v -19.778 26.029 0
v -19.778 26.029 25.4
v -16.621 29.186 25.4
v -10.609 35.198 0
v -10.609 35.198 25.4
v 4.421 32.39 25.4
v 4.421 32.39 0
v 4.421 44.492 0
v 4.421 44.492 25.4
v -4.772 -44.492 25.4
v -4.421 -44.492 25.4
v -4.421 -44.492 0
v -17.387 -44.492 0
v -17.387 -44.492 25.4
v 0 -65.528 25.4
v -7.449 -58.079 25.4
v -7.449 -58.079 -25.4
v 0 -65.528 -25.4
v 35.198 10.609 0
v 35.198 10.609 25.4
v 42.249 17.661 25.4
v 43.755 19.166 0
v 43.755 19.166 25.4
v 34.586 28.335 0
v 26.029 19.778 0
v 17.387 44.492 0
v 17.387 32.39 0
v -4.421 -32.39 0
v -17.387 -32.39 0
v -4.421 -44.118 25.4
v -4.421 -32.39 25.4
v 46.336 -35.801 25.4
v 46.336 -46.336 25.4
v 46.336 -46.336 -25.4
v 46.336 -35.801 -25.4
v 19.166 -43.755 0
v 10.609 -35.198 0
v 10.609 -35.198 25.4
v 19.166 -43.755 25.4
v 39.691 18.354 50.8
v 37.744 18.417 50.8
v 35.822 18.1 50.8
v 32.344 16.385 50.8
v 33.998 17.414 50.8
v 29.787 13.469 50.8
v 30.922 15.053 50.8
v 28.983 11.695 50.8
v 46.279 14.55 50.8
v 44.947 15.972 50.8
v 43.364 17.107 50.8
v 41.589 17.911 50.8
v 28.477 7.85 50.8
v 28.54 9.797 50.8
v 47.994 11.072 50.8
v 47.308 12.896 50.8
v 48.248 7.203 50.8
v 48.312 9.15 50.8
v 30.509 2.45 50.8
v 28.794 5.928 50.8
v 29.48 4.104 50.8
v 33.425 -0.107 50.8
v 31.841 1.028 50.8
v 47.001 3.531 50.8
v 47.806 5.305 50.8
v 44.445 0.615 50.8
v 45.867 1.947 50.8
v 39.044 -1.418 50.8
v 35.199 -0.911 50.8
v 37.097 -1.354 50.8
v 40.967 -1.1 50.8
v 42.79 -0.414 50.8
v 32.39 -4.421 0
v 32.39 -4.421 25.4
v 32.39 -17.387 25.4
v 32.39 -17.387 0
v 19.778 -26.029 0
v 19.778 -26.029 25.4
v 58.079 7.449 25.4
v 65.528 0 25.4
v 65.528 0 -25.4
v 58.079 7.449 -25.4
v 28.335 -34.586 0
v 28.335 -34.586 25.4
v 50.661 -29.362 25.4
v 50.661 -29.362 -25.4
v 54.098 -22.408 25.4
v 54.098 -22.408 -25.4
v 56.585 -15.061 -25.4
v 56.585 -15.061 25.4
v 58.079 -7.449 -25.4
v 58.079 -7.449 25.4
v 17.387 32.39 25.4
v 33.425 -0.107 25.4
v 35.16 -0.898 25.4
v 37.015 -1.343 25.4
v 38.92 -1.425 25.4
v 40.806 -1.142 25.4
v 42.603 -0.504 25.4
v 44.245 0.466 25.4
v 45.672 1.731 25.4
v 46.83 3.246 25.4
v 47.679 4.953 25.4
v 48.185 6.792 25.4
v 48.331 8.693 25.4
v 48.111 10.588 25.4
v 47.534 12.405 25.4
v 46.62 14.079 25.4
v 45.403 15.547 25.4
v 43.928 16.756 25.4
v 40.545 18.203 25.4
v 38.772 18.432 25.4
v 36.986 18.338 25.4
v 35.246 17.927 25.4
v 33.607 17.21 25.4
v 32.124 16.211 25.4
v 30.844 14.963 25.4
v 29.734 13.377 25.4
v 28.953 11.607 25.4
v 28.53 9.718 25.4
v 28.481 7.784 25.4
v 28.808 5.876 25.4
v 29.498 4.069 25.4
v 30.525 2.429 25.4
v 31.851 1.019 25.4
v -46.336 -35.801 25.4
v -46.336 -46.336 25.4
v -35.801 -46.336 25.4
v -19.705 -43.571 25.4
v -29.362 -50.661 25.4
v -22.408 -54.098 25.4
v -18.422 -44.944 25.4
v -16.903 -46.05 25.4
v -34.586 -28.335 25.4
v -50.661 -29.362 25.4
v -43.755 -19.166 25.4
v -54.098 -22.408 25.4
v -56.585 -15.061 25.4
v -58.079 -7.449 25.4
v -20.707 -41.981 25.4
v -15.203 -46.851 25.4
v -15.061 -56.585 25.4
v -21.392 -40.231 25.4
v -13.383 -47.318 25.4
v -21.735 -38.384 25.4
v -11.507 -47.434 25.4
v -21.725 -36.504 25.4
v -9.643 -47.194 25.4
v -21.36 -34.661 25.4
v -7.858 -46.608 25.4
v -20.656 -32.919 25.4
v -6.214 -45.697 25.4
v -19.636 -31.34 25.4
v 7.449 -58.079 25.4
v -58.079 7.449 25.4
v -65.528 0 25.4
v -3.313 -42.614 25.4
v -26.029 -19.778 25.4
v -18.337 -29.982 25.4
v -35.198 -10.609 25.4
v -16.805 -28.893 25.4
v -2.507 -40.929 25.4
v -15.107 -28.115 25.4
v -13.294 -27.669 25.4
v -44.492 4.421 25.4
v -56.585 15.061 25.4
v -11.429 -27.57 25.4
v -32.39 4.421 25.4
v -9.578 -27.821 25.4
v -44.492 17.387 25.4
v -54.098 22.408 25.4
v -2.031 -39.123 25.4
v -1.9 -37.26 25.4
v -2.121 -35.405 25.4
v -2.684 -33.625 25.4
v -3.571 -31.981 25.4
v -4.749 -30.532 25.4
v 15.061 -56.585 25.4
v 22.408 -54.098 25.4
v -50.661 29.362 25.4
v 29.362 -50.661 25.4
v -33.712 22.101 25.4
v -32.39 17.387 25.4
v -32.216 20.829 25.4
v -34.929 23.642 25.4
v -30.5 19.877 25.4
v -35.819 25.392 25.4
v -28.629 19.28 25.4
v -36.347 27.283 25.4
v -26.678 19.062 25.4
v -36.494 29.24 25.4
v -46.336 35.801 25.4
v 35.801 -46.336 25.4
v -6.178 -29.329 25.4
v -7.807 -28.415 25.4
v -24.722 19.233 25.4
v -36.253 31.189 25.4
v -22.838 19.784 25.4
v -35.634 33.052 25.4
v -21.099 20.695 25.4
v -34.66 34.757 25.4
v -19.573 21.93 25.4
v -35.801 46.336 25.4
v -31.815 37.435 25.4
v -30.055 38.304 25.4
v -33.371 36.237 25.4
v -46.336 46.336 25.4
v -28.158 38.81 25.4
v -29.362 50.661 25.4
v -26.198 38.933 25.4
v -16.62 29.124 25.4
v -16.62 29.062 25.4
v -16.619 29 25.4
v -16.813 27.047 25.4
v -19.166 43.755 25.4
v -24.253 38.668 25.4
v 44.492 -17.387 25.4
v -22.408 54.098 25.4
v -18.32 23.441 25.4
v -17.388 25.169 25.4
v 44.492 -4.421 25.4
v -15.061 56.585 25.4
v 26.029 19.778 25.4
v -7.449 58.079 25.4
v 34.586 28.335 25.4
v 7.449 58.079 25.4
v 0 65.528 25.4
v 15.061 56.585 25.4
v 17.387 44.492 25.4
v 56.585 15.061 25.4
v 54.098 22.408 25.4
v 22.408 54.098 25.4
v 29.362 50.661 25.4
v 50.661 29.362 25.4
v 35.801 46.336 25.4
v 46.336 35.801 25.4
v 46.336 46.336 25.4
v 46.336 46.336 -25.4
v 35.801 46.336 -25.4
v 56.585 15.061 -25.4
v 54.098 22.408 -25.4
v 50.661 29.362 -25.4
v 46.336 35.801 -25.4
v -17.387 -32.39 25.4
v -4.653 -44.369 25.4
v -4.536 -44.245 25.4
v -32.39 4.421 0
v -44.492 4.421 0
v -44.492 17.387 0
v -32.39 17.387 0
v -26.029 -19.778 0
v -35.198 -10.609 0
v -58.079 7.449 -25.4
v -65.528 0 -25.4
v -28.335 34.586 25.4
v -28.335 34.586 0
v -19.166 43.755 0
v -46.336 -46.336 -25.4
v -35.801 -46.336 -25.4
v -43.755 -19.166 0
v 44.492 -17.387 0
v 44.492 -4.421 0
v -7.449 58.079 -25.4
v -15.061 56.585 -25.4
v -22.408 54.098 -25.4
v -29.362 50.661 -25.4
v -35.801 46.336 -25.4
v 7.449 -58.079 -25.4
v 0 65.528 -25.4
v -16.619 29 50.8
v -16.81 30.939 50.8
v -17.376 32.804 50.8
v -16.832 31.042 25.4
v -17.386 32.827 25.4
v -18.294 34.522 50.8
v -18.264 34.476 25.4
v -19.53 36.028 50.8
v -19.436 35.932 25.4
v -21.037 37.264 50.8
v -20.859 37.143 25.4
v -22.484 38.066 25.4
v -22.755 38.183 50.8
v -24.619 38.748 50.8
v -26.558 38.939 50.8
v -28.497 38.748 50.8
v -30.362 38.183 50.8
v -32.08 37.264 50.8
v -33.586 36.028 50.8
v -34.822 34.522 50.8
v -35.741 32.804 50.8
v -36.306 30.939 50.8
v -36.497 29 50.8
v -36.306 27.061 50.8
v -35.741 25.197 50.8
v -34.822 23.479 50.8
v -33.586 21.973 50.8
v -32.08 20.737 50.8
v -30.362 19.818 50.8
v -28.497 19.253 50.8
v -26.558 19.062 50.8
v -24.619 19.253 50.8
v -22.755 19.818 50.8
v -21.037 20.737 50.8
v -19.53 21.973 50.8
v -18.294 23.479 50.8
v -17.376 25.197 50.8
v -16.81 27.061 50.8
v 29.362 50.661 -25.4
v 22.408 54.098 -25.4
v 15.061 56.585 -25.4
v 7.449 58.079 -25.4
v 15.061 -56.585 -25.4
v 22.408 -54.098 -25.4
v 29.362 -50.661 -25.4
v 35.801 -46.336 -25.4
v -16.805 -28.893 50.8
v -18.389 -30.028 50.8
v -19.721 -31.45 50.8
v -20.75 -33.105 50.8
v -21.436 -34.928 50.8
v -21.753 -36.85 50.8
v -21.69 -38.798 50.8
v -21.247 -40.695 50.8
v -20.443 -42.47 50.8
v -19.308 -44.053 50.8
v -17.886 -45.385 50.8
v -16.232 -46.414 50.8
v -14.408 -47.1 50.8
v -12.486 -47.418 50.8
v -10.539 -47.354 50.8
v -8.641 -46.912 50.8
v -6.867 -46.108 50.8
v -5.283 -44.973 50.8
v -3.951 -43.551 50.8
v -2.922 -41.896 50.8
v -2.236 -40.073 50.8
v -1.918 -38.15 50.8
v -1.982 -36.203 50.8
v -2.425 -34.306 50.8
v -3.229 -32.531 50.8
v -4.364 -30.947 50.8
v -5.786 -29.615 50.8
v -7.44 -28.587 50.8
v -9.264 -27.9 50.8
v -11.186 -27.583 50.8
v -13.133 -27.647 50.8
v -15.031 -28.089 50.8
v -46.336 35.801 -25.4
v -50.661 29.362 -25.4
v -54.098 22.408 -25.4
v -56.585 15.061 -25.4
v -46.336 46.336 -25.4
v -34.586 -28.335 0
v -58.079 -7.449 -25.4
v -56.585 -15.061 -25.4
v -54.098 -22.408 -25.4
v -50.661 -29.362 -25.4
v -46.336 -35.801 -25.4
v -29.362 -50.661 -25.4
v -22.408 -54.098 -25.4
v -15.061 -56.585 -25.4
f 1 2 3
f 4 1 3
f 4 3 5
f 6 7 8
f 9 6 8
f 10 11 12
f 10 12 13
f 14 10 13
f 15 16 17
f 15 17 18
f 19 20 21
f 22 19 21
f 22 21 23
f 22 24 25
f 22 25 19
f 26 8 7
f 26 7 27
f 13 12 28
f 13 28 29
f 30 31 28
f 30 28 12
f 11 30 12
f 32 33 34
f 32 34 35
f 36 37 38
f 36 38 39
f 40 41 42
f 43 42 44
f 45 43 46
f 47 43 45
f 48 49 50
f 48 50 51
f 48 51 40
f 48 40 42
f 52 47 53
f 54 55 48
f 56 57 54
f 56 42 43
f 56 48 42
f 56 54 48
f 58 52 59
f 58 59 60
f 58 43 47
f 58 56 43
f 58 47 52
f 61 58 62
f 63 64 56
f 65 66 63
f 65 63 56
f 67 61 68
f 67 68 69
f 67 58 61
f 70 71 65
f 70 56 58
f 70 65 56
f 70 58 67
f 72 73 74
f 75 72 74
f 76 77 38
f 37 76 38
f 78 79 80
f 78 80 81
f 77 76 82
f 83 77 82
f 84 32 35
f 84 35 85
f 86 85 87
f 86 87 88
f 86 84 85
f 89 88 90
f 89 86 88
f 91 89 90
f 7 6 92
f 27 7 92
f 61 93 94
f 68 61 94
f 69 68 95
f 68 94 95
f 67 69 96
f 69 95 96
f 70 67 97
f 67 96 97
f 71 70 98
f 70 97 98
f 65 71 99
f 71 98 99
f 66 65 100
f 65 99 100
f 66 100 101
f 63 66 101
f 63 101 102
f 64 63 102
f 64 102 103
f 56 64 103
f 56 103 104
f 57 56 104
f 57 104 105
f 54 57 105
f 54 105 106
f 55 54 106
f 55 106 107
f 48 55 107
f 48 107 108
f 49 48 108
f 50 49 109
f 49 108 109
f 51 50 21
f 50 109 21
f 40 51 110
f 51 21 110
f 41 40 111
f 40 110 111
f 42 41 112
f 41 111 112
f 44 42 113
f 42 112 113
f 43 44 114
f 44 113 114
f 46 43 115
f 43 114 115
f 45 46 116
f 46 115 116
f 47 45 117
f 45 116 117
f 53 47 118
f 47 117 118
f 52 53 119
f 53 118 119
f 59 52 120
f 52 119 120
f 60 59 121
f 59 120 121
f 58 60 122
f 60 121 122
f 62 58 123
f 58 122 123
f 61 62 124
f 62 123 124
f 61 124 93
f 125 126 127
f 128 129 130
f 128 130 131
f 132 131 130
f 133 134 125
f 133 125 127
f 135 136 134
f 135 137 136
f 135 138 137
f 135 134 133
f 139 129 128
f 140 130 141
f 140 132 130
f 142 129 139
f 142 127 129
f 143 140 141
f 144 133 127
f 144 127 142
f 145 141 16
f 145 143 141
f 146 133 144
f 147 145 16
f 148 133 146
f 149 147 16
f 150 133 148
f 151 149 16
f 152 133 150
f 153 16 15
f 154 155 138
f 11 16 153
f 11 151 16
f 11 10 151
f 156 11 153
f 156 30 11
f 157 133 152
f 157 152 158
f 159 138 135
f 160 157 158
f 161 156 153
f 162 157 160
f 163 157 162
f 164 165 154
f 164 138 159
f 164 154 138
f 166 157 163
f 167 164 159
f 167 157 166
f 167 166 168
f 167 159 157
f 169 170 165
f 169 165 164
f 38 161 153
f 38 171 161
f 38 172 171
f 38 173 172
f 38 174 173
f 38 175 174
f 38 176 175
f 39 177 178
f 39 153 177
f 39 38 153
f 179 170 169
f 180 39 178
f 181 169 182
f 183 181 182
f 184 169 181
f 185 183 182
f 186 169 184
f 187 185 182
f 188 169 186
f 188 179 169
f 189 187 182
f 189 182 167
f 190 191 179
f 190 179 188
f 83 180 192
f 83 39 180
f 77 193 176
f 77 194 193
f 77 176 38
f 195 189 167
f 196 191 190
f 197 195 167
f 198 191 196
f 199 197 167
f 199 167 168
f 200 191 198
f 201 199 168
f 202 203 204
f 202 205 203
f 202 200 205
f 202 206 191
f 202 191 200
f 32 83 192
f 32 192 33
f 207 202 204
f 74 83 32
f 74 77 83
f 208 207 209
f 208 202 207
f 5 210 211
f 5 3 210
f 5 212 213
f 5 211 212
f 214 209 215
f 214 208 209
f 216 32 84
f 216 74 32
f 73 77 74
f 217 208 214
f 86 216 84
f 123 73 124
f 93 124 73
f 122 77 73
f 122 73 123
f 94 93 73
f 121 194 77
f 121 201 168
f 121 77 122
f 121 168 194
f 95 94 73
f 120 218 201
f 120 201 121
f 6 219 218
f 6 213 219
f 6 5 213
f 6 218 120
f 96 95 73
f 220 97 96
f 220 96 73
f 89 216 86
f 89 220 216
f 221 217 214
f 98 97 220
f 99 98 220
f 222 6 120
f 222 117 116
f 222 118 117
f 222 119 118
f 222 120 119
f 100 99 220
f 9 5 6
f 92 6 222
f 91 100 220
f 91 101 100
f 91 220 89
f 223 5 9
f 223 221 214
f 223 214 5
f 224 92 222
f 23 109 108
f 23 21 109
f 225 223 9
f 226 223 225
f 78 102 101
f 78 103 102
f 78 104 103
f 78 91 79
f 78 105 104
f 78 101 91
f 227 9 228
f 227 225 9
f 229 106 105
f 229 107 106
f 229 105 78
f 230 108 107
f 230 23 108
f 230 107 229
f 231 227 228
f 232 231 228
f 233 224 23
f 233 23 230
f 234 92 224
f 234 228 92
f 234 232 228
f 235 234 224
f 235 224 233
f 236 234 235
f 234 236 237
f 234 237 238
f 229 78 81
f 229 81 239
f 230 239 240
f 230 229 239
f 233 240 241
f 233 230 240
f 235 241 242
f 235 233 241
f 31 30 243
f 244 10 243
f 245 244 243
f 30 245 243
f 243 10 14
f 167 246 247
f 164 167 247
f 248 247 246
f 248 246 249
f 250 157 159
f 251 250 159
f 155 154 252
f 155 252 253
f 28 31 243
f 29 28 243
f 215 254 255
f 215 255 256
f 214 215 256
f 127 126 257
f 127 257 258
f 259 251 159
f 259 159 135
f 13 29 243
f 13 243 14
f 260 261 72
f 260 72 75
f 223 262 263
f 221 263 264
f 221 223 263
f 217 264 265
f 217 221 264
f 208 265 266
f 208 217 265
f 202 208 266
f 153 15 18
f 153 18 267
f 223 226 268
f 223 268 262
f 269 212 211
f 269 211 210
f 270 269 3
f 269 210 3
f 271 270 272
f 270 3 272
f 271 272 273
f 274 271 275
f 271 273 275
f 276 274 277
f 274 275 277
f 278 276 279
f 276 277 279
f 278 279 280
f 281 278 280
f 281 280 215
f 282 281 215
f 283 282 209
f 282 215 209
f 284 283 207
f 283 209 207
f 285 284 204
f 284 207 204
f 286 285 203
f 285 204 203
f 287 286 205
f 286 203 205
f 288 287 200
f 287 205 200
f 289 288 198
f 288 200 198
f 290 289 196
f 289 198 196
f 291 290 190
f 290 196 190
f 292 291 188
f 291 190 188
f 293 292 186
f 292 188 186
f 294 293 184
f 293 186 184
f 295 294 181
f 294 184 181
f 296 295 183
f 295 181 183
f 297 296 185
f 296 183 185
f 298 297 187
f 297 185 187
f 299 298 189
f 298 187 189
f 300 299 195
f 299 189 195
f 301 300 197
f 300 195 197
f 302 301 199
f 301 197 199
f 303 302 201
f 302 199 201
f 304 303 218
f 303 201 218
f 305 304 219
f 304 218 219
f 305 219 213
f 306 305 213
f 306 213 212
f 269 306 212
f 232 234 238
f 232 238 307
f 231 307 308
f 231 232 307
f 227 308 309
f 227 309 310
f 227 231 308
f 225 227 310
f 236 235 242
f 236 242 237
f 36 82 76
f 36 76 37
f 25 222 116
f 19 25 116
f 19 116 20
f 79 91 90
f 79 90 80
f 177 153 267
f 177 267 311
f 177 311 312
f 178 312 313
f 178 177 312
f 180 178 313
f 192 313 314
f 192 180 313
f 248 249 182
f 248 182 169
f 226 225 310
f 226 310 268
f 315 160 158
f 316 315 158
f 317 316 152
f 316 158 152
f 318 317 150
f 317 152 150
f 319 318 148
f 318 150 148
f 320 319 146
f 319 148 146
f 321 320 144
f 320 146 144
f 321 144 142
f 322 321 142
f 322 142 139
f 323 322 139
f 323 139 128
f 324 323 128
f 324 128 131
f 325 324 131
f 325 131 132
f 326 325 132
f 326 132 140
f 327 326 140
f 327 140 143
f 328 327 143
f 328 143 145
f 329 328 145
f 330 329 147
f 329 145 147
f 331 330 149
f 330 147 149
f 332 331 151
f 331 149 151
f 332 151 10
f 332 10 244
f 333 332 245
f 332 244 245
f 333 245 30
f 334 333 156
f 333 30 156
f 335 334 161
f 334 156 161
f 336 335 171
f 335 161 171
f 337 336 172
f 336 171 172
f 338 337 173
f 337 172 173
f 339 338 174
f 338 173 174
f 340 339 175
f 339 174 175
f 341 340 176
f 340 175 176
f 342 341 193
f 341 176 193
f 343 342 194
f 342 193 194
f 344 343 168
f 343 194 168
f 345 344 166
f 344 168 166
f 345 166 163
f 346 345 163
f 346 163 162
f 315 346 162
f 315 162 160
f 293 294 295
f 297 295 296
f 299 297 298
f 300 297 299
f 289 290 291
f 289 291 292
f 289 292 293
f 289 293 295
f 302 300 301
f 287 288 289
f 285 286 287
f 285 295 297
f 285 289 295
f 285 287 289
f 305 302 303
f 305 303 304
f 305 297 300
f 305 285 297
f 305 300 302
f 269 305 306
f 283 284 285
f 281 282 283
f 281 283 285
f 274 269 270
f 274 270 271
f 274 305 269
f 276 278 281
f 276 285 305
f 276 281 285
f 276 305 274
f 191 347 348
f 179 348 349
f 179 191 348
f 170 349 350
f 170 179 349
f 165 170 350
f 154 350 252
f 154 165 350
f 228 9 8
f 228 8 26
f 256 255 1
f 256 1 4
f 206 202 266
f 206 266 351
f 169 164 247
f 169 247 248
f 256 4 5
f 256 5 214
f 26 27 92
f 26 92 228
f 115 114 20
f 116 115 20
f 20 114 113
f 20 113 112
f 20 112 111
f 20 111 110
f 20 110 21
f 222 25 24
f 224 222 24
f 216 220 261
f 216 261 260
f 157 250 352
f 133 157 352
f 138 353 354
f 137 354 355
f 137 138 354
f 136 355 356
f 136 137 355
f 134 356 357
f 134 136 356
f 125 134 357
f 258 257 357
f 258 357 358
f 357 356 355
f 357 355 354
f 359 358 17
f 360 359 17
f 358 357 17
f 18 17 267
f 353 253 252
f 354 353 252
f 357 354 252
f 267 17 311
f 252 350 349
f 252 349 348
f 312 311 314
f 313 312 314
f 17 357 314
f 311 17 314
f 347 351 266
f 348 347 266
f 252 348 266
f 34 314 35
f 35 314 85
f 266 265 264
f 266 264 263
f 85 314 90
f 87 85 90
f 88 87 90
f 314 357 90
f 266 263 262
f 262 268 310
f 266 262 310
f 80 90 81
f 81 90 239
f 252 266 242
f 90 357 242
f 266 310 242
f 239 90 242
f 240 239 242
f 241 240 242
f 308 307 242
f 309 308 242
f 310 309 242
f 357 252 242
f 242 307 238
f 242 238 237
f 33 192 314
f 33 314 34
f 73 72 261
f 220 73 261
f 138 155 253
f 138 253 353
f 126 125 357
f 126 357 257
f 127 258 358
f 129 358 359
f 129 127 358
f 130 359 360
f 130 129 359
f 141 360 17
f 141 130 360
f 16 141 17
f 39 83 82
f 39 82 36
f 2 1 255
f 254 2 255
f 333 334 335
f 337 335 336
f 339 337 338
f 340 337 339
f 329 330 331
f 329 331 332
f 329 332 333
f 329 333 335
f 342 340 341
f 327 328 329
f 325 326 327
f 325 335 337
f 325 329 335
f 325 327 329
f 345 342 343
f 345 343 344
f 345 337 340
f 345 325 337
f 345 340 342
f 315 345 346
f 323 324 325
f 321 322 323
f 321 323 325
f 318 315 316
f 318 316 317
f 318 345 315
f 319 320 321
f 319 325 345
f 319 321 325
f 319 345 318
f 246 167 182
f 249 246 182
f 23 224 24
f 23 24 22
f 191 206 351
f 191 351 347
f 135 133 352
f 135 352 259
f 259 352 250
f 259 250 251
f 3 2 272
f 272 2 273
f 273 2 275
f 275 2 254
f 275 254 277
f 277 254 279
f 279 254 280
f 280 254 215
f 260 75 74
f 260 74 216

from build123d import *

# Parameters (mm, degrees)
F0_R            = 58.5548573359
F1_DEPTH        = 25.4
F2_R            = 9.9387856365
F3_DEPTH        = 25.4
F3_COPIES_COUNT = 3
F5_DEPTH        = 50.8
F5_COPIES_COUNT = 8
F6_W            = 12.9660330713
F6_H            = 12.1016278863
F7_DEPTH        = 25.4
F7_COPIES_COUNT = 8


# Not quite as in the source:
# - a pattern or mirror of a feature is missing from the dataset's text; its kind, count and spacing are read off the source's solid


with BuildPart() as f1:
    # F0 (on Top) → F1 (new body, symmetric)
    with BuildSketch(Plane.XY):
        Circle(F0_R)
    extrude(amount=F1_DEPTH, both=True)

    # F2 (on face) → F3 (join)
    with BuildSketch(Plane.XY.offset(25.4)):
        with Locations((-26.5582595021, 29.0003977716)):
            Circle(F2_R)
    f3 = extrude(amount=F3_DEPTH)

    # F3_copies: F3 ×3 about axis
    f3_copies_axis = Axis((0, 0, 0), (0, 0, 1))
    for i in range(1, F3_COPIES_COUNT):
        add(f3.rotate(f3_copies_axis, i * 360 / F3_COPIES_COUNT))

    # F4 (on face) → F5 (join, through all)
    with BuildSketch(Plane.XY.offset(25.4)):
        with BuildLine():
            Line((0, 65.528380896), (-7.4493038573, 58.0790770387))
            ThreePointArc((-7.4493038573, 58.0790770387), (0, 58.5548573359), (7.4493038573, 58.0790770387))
            Line((7.4493038573, 58.0790770387), (0, 65.528380896))
        make_face()
    f5 = extrude(amount=-F5_DEPTH)

    # F5_copies: F5 ×8 about axis
    f5_copies_axis = Axis((0, 0, 0), (0, 0, 1))
    for i in range(1, F5_COPIES_COUNT):
        add(f5.rotate(f5_copies_axis, i * 360 / F5_COPIES_COUNT))

    # F6 (on face) → F7 (cut)
    with BuildSketch(Plane.XY.offset(25.4)):
        with Locations((10.9036043286, 38.4410806)):
            Rectangle(F6_W, F6_H)
    f7 = extrude(amount=-F7_DEPTH, mode=Mode.SUBTRACT)

    # F7_copies: F7 ×8 about axis
    f7_copies_axis = Axis((0, 0, 0), (0, 0, 1))
    for i in range(1, F7_COPIES_COUNT):
        add(f7.rotate(f7_copies_axis, i * 360 / F7_COPIES_COUNT), mode=Mode.SUBTRACT)


solid = f1.part
